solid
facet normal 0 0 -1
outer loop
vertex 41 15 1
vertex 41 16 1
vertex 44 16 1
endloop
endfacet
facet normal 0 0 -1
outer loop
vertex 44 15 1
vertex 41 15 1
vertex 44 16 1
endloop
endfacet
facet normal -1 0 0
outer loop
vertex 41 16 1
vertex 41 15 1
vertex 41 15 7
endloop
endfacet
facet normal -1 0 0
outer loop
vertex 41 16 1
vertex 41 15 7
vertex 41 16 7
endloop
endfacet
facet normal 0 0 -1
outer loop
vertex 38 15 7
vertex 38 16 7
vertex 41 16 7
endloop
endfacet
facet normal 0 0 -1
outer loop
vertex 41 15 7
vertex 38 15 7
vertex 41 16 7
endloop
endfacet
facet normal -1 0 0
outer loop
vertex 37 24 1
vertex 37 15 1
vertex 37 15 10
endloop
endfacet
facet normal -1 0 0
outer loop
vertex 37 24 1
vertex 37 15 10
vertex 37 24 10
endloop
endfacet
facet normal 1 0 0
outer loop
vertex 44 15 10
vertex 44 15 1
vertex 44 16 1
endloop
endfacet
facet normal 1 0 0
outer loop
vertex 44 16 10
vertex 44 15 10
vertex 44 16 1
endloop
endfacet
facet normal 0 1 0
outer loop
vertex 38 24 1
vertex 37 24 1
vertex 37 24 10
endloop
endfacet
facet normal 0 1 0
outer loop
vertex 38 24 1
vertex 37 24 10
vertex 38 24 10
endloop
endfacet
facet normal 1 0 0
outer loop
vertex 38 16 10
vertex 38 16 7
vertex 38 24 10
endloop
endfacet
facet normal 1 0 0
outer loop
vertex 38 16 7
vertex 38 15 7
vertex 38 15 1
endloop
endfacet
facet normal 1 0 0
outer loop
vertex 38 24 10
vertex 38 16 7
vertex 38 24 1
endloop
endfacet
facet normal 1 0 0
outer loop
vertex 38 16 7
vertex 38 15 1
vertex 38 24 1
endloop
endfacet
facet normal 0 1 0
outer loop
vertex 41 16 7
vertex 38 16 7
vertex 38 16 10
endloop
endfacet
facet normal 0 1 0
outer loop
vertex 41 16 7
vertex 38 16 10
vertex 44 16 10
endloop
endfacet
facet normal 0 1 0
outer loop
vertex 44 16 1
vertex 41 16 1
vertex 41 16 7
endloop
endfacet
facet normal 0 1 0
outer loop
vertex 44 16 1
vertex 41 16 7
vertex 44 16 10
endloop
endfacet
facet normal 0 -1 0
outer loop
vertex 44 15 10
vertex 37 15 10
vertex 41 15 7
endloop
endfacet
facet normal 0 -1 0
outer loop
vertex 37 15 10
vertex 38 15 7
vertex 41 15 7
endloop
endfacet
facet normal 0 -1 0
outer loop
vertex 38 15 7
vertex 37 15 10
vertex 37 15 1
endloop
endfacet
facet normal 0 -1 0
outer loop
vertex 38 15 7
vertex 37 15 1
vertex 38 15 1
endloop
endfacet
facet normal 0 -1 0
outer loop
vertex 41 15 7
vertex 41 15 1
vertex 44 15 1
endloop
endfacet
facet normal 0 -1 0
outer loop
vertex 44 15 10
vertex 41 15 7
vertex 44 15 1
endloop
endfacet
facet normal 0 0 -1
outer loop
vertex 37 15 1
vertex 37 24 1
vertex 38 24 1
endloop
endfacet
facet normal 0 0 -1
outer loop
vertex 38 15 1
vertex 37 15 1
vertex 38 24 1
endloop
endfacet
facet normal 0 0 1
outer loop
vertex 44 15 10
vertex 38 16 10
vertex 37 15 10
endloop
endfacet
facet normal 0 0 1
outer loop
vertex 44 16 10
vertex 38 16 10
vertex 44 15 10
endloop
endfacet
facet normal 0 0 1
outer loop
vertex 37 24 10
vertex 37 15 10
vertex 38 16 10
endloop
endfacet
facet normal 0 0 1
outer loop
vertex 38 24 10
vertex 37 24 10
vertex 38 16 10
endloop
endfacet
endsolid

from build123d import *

# Parameters (mm, degrees)
BOX016_W     = 3
BOX016_H     = 1
BOX016_DEPTH = 3
BOX015_W     = 1
BOX015_H     = 9
BOX015_DEPTH = 9
BOX014_W     = 3
BOX014_H     = 1
BOX014_DEPTH = 9


with BuildPart() as box016:
    # Box016 → Box016 (new body)
    with BuildSketch(Plane(origin=(27, 15, 7), x_dir=(1, 0, 0), z_dir=(0, 0, 1))):
        with Locations((1.5, 0.5)):
            Rectangle(BOX016_W, BOX016_H)
    extrude(amount=BOX016_DEPTH)


with BuildPart() as box015:
    # Box015 → Box015 (new body)
    with BuildSketch(Plane(origin=(26, 15, 1), x_dir=(1, 0, 0), z_dir=(0, 0, 1))):
        with Locations((0.5, 4.5)):
            Rectangle(BOX015_W, BOX015_H)
    extrude(amount=BOX015_DEPTH)


with BuildPart() as fusion:
    # Box014 → Box014 (new body)
    with BuildSketch(Plane(origin=(30, 15, 1), x_dir=(1, 0, 0), z_dir=(0, 0, 1))):
        with Locations((1.5, 0.5)):
            Rectangle(BOX014_W, BOX014_H)
    extrude(amount=BOX014_DEPTH)

    # Fusion: union Box016, Box015
    add(box016.part)
    add(box015.part)


with BuildPart() as fusion_1:
    # Fusion placement: moved
    add(fusion.part.moved(Location((11, 0, 0))))


solid = fusion_1.part
